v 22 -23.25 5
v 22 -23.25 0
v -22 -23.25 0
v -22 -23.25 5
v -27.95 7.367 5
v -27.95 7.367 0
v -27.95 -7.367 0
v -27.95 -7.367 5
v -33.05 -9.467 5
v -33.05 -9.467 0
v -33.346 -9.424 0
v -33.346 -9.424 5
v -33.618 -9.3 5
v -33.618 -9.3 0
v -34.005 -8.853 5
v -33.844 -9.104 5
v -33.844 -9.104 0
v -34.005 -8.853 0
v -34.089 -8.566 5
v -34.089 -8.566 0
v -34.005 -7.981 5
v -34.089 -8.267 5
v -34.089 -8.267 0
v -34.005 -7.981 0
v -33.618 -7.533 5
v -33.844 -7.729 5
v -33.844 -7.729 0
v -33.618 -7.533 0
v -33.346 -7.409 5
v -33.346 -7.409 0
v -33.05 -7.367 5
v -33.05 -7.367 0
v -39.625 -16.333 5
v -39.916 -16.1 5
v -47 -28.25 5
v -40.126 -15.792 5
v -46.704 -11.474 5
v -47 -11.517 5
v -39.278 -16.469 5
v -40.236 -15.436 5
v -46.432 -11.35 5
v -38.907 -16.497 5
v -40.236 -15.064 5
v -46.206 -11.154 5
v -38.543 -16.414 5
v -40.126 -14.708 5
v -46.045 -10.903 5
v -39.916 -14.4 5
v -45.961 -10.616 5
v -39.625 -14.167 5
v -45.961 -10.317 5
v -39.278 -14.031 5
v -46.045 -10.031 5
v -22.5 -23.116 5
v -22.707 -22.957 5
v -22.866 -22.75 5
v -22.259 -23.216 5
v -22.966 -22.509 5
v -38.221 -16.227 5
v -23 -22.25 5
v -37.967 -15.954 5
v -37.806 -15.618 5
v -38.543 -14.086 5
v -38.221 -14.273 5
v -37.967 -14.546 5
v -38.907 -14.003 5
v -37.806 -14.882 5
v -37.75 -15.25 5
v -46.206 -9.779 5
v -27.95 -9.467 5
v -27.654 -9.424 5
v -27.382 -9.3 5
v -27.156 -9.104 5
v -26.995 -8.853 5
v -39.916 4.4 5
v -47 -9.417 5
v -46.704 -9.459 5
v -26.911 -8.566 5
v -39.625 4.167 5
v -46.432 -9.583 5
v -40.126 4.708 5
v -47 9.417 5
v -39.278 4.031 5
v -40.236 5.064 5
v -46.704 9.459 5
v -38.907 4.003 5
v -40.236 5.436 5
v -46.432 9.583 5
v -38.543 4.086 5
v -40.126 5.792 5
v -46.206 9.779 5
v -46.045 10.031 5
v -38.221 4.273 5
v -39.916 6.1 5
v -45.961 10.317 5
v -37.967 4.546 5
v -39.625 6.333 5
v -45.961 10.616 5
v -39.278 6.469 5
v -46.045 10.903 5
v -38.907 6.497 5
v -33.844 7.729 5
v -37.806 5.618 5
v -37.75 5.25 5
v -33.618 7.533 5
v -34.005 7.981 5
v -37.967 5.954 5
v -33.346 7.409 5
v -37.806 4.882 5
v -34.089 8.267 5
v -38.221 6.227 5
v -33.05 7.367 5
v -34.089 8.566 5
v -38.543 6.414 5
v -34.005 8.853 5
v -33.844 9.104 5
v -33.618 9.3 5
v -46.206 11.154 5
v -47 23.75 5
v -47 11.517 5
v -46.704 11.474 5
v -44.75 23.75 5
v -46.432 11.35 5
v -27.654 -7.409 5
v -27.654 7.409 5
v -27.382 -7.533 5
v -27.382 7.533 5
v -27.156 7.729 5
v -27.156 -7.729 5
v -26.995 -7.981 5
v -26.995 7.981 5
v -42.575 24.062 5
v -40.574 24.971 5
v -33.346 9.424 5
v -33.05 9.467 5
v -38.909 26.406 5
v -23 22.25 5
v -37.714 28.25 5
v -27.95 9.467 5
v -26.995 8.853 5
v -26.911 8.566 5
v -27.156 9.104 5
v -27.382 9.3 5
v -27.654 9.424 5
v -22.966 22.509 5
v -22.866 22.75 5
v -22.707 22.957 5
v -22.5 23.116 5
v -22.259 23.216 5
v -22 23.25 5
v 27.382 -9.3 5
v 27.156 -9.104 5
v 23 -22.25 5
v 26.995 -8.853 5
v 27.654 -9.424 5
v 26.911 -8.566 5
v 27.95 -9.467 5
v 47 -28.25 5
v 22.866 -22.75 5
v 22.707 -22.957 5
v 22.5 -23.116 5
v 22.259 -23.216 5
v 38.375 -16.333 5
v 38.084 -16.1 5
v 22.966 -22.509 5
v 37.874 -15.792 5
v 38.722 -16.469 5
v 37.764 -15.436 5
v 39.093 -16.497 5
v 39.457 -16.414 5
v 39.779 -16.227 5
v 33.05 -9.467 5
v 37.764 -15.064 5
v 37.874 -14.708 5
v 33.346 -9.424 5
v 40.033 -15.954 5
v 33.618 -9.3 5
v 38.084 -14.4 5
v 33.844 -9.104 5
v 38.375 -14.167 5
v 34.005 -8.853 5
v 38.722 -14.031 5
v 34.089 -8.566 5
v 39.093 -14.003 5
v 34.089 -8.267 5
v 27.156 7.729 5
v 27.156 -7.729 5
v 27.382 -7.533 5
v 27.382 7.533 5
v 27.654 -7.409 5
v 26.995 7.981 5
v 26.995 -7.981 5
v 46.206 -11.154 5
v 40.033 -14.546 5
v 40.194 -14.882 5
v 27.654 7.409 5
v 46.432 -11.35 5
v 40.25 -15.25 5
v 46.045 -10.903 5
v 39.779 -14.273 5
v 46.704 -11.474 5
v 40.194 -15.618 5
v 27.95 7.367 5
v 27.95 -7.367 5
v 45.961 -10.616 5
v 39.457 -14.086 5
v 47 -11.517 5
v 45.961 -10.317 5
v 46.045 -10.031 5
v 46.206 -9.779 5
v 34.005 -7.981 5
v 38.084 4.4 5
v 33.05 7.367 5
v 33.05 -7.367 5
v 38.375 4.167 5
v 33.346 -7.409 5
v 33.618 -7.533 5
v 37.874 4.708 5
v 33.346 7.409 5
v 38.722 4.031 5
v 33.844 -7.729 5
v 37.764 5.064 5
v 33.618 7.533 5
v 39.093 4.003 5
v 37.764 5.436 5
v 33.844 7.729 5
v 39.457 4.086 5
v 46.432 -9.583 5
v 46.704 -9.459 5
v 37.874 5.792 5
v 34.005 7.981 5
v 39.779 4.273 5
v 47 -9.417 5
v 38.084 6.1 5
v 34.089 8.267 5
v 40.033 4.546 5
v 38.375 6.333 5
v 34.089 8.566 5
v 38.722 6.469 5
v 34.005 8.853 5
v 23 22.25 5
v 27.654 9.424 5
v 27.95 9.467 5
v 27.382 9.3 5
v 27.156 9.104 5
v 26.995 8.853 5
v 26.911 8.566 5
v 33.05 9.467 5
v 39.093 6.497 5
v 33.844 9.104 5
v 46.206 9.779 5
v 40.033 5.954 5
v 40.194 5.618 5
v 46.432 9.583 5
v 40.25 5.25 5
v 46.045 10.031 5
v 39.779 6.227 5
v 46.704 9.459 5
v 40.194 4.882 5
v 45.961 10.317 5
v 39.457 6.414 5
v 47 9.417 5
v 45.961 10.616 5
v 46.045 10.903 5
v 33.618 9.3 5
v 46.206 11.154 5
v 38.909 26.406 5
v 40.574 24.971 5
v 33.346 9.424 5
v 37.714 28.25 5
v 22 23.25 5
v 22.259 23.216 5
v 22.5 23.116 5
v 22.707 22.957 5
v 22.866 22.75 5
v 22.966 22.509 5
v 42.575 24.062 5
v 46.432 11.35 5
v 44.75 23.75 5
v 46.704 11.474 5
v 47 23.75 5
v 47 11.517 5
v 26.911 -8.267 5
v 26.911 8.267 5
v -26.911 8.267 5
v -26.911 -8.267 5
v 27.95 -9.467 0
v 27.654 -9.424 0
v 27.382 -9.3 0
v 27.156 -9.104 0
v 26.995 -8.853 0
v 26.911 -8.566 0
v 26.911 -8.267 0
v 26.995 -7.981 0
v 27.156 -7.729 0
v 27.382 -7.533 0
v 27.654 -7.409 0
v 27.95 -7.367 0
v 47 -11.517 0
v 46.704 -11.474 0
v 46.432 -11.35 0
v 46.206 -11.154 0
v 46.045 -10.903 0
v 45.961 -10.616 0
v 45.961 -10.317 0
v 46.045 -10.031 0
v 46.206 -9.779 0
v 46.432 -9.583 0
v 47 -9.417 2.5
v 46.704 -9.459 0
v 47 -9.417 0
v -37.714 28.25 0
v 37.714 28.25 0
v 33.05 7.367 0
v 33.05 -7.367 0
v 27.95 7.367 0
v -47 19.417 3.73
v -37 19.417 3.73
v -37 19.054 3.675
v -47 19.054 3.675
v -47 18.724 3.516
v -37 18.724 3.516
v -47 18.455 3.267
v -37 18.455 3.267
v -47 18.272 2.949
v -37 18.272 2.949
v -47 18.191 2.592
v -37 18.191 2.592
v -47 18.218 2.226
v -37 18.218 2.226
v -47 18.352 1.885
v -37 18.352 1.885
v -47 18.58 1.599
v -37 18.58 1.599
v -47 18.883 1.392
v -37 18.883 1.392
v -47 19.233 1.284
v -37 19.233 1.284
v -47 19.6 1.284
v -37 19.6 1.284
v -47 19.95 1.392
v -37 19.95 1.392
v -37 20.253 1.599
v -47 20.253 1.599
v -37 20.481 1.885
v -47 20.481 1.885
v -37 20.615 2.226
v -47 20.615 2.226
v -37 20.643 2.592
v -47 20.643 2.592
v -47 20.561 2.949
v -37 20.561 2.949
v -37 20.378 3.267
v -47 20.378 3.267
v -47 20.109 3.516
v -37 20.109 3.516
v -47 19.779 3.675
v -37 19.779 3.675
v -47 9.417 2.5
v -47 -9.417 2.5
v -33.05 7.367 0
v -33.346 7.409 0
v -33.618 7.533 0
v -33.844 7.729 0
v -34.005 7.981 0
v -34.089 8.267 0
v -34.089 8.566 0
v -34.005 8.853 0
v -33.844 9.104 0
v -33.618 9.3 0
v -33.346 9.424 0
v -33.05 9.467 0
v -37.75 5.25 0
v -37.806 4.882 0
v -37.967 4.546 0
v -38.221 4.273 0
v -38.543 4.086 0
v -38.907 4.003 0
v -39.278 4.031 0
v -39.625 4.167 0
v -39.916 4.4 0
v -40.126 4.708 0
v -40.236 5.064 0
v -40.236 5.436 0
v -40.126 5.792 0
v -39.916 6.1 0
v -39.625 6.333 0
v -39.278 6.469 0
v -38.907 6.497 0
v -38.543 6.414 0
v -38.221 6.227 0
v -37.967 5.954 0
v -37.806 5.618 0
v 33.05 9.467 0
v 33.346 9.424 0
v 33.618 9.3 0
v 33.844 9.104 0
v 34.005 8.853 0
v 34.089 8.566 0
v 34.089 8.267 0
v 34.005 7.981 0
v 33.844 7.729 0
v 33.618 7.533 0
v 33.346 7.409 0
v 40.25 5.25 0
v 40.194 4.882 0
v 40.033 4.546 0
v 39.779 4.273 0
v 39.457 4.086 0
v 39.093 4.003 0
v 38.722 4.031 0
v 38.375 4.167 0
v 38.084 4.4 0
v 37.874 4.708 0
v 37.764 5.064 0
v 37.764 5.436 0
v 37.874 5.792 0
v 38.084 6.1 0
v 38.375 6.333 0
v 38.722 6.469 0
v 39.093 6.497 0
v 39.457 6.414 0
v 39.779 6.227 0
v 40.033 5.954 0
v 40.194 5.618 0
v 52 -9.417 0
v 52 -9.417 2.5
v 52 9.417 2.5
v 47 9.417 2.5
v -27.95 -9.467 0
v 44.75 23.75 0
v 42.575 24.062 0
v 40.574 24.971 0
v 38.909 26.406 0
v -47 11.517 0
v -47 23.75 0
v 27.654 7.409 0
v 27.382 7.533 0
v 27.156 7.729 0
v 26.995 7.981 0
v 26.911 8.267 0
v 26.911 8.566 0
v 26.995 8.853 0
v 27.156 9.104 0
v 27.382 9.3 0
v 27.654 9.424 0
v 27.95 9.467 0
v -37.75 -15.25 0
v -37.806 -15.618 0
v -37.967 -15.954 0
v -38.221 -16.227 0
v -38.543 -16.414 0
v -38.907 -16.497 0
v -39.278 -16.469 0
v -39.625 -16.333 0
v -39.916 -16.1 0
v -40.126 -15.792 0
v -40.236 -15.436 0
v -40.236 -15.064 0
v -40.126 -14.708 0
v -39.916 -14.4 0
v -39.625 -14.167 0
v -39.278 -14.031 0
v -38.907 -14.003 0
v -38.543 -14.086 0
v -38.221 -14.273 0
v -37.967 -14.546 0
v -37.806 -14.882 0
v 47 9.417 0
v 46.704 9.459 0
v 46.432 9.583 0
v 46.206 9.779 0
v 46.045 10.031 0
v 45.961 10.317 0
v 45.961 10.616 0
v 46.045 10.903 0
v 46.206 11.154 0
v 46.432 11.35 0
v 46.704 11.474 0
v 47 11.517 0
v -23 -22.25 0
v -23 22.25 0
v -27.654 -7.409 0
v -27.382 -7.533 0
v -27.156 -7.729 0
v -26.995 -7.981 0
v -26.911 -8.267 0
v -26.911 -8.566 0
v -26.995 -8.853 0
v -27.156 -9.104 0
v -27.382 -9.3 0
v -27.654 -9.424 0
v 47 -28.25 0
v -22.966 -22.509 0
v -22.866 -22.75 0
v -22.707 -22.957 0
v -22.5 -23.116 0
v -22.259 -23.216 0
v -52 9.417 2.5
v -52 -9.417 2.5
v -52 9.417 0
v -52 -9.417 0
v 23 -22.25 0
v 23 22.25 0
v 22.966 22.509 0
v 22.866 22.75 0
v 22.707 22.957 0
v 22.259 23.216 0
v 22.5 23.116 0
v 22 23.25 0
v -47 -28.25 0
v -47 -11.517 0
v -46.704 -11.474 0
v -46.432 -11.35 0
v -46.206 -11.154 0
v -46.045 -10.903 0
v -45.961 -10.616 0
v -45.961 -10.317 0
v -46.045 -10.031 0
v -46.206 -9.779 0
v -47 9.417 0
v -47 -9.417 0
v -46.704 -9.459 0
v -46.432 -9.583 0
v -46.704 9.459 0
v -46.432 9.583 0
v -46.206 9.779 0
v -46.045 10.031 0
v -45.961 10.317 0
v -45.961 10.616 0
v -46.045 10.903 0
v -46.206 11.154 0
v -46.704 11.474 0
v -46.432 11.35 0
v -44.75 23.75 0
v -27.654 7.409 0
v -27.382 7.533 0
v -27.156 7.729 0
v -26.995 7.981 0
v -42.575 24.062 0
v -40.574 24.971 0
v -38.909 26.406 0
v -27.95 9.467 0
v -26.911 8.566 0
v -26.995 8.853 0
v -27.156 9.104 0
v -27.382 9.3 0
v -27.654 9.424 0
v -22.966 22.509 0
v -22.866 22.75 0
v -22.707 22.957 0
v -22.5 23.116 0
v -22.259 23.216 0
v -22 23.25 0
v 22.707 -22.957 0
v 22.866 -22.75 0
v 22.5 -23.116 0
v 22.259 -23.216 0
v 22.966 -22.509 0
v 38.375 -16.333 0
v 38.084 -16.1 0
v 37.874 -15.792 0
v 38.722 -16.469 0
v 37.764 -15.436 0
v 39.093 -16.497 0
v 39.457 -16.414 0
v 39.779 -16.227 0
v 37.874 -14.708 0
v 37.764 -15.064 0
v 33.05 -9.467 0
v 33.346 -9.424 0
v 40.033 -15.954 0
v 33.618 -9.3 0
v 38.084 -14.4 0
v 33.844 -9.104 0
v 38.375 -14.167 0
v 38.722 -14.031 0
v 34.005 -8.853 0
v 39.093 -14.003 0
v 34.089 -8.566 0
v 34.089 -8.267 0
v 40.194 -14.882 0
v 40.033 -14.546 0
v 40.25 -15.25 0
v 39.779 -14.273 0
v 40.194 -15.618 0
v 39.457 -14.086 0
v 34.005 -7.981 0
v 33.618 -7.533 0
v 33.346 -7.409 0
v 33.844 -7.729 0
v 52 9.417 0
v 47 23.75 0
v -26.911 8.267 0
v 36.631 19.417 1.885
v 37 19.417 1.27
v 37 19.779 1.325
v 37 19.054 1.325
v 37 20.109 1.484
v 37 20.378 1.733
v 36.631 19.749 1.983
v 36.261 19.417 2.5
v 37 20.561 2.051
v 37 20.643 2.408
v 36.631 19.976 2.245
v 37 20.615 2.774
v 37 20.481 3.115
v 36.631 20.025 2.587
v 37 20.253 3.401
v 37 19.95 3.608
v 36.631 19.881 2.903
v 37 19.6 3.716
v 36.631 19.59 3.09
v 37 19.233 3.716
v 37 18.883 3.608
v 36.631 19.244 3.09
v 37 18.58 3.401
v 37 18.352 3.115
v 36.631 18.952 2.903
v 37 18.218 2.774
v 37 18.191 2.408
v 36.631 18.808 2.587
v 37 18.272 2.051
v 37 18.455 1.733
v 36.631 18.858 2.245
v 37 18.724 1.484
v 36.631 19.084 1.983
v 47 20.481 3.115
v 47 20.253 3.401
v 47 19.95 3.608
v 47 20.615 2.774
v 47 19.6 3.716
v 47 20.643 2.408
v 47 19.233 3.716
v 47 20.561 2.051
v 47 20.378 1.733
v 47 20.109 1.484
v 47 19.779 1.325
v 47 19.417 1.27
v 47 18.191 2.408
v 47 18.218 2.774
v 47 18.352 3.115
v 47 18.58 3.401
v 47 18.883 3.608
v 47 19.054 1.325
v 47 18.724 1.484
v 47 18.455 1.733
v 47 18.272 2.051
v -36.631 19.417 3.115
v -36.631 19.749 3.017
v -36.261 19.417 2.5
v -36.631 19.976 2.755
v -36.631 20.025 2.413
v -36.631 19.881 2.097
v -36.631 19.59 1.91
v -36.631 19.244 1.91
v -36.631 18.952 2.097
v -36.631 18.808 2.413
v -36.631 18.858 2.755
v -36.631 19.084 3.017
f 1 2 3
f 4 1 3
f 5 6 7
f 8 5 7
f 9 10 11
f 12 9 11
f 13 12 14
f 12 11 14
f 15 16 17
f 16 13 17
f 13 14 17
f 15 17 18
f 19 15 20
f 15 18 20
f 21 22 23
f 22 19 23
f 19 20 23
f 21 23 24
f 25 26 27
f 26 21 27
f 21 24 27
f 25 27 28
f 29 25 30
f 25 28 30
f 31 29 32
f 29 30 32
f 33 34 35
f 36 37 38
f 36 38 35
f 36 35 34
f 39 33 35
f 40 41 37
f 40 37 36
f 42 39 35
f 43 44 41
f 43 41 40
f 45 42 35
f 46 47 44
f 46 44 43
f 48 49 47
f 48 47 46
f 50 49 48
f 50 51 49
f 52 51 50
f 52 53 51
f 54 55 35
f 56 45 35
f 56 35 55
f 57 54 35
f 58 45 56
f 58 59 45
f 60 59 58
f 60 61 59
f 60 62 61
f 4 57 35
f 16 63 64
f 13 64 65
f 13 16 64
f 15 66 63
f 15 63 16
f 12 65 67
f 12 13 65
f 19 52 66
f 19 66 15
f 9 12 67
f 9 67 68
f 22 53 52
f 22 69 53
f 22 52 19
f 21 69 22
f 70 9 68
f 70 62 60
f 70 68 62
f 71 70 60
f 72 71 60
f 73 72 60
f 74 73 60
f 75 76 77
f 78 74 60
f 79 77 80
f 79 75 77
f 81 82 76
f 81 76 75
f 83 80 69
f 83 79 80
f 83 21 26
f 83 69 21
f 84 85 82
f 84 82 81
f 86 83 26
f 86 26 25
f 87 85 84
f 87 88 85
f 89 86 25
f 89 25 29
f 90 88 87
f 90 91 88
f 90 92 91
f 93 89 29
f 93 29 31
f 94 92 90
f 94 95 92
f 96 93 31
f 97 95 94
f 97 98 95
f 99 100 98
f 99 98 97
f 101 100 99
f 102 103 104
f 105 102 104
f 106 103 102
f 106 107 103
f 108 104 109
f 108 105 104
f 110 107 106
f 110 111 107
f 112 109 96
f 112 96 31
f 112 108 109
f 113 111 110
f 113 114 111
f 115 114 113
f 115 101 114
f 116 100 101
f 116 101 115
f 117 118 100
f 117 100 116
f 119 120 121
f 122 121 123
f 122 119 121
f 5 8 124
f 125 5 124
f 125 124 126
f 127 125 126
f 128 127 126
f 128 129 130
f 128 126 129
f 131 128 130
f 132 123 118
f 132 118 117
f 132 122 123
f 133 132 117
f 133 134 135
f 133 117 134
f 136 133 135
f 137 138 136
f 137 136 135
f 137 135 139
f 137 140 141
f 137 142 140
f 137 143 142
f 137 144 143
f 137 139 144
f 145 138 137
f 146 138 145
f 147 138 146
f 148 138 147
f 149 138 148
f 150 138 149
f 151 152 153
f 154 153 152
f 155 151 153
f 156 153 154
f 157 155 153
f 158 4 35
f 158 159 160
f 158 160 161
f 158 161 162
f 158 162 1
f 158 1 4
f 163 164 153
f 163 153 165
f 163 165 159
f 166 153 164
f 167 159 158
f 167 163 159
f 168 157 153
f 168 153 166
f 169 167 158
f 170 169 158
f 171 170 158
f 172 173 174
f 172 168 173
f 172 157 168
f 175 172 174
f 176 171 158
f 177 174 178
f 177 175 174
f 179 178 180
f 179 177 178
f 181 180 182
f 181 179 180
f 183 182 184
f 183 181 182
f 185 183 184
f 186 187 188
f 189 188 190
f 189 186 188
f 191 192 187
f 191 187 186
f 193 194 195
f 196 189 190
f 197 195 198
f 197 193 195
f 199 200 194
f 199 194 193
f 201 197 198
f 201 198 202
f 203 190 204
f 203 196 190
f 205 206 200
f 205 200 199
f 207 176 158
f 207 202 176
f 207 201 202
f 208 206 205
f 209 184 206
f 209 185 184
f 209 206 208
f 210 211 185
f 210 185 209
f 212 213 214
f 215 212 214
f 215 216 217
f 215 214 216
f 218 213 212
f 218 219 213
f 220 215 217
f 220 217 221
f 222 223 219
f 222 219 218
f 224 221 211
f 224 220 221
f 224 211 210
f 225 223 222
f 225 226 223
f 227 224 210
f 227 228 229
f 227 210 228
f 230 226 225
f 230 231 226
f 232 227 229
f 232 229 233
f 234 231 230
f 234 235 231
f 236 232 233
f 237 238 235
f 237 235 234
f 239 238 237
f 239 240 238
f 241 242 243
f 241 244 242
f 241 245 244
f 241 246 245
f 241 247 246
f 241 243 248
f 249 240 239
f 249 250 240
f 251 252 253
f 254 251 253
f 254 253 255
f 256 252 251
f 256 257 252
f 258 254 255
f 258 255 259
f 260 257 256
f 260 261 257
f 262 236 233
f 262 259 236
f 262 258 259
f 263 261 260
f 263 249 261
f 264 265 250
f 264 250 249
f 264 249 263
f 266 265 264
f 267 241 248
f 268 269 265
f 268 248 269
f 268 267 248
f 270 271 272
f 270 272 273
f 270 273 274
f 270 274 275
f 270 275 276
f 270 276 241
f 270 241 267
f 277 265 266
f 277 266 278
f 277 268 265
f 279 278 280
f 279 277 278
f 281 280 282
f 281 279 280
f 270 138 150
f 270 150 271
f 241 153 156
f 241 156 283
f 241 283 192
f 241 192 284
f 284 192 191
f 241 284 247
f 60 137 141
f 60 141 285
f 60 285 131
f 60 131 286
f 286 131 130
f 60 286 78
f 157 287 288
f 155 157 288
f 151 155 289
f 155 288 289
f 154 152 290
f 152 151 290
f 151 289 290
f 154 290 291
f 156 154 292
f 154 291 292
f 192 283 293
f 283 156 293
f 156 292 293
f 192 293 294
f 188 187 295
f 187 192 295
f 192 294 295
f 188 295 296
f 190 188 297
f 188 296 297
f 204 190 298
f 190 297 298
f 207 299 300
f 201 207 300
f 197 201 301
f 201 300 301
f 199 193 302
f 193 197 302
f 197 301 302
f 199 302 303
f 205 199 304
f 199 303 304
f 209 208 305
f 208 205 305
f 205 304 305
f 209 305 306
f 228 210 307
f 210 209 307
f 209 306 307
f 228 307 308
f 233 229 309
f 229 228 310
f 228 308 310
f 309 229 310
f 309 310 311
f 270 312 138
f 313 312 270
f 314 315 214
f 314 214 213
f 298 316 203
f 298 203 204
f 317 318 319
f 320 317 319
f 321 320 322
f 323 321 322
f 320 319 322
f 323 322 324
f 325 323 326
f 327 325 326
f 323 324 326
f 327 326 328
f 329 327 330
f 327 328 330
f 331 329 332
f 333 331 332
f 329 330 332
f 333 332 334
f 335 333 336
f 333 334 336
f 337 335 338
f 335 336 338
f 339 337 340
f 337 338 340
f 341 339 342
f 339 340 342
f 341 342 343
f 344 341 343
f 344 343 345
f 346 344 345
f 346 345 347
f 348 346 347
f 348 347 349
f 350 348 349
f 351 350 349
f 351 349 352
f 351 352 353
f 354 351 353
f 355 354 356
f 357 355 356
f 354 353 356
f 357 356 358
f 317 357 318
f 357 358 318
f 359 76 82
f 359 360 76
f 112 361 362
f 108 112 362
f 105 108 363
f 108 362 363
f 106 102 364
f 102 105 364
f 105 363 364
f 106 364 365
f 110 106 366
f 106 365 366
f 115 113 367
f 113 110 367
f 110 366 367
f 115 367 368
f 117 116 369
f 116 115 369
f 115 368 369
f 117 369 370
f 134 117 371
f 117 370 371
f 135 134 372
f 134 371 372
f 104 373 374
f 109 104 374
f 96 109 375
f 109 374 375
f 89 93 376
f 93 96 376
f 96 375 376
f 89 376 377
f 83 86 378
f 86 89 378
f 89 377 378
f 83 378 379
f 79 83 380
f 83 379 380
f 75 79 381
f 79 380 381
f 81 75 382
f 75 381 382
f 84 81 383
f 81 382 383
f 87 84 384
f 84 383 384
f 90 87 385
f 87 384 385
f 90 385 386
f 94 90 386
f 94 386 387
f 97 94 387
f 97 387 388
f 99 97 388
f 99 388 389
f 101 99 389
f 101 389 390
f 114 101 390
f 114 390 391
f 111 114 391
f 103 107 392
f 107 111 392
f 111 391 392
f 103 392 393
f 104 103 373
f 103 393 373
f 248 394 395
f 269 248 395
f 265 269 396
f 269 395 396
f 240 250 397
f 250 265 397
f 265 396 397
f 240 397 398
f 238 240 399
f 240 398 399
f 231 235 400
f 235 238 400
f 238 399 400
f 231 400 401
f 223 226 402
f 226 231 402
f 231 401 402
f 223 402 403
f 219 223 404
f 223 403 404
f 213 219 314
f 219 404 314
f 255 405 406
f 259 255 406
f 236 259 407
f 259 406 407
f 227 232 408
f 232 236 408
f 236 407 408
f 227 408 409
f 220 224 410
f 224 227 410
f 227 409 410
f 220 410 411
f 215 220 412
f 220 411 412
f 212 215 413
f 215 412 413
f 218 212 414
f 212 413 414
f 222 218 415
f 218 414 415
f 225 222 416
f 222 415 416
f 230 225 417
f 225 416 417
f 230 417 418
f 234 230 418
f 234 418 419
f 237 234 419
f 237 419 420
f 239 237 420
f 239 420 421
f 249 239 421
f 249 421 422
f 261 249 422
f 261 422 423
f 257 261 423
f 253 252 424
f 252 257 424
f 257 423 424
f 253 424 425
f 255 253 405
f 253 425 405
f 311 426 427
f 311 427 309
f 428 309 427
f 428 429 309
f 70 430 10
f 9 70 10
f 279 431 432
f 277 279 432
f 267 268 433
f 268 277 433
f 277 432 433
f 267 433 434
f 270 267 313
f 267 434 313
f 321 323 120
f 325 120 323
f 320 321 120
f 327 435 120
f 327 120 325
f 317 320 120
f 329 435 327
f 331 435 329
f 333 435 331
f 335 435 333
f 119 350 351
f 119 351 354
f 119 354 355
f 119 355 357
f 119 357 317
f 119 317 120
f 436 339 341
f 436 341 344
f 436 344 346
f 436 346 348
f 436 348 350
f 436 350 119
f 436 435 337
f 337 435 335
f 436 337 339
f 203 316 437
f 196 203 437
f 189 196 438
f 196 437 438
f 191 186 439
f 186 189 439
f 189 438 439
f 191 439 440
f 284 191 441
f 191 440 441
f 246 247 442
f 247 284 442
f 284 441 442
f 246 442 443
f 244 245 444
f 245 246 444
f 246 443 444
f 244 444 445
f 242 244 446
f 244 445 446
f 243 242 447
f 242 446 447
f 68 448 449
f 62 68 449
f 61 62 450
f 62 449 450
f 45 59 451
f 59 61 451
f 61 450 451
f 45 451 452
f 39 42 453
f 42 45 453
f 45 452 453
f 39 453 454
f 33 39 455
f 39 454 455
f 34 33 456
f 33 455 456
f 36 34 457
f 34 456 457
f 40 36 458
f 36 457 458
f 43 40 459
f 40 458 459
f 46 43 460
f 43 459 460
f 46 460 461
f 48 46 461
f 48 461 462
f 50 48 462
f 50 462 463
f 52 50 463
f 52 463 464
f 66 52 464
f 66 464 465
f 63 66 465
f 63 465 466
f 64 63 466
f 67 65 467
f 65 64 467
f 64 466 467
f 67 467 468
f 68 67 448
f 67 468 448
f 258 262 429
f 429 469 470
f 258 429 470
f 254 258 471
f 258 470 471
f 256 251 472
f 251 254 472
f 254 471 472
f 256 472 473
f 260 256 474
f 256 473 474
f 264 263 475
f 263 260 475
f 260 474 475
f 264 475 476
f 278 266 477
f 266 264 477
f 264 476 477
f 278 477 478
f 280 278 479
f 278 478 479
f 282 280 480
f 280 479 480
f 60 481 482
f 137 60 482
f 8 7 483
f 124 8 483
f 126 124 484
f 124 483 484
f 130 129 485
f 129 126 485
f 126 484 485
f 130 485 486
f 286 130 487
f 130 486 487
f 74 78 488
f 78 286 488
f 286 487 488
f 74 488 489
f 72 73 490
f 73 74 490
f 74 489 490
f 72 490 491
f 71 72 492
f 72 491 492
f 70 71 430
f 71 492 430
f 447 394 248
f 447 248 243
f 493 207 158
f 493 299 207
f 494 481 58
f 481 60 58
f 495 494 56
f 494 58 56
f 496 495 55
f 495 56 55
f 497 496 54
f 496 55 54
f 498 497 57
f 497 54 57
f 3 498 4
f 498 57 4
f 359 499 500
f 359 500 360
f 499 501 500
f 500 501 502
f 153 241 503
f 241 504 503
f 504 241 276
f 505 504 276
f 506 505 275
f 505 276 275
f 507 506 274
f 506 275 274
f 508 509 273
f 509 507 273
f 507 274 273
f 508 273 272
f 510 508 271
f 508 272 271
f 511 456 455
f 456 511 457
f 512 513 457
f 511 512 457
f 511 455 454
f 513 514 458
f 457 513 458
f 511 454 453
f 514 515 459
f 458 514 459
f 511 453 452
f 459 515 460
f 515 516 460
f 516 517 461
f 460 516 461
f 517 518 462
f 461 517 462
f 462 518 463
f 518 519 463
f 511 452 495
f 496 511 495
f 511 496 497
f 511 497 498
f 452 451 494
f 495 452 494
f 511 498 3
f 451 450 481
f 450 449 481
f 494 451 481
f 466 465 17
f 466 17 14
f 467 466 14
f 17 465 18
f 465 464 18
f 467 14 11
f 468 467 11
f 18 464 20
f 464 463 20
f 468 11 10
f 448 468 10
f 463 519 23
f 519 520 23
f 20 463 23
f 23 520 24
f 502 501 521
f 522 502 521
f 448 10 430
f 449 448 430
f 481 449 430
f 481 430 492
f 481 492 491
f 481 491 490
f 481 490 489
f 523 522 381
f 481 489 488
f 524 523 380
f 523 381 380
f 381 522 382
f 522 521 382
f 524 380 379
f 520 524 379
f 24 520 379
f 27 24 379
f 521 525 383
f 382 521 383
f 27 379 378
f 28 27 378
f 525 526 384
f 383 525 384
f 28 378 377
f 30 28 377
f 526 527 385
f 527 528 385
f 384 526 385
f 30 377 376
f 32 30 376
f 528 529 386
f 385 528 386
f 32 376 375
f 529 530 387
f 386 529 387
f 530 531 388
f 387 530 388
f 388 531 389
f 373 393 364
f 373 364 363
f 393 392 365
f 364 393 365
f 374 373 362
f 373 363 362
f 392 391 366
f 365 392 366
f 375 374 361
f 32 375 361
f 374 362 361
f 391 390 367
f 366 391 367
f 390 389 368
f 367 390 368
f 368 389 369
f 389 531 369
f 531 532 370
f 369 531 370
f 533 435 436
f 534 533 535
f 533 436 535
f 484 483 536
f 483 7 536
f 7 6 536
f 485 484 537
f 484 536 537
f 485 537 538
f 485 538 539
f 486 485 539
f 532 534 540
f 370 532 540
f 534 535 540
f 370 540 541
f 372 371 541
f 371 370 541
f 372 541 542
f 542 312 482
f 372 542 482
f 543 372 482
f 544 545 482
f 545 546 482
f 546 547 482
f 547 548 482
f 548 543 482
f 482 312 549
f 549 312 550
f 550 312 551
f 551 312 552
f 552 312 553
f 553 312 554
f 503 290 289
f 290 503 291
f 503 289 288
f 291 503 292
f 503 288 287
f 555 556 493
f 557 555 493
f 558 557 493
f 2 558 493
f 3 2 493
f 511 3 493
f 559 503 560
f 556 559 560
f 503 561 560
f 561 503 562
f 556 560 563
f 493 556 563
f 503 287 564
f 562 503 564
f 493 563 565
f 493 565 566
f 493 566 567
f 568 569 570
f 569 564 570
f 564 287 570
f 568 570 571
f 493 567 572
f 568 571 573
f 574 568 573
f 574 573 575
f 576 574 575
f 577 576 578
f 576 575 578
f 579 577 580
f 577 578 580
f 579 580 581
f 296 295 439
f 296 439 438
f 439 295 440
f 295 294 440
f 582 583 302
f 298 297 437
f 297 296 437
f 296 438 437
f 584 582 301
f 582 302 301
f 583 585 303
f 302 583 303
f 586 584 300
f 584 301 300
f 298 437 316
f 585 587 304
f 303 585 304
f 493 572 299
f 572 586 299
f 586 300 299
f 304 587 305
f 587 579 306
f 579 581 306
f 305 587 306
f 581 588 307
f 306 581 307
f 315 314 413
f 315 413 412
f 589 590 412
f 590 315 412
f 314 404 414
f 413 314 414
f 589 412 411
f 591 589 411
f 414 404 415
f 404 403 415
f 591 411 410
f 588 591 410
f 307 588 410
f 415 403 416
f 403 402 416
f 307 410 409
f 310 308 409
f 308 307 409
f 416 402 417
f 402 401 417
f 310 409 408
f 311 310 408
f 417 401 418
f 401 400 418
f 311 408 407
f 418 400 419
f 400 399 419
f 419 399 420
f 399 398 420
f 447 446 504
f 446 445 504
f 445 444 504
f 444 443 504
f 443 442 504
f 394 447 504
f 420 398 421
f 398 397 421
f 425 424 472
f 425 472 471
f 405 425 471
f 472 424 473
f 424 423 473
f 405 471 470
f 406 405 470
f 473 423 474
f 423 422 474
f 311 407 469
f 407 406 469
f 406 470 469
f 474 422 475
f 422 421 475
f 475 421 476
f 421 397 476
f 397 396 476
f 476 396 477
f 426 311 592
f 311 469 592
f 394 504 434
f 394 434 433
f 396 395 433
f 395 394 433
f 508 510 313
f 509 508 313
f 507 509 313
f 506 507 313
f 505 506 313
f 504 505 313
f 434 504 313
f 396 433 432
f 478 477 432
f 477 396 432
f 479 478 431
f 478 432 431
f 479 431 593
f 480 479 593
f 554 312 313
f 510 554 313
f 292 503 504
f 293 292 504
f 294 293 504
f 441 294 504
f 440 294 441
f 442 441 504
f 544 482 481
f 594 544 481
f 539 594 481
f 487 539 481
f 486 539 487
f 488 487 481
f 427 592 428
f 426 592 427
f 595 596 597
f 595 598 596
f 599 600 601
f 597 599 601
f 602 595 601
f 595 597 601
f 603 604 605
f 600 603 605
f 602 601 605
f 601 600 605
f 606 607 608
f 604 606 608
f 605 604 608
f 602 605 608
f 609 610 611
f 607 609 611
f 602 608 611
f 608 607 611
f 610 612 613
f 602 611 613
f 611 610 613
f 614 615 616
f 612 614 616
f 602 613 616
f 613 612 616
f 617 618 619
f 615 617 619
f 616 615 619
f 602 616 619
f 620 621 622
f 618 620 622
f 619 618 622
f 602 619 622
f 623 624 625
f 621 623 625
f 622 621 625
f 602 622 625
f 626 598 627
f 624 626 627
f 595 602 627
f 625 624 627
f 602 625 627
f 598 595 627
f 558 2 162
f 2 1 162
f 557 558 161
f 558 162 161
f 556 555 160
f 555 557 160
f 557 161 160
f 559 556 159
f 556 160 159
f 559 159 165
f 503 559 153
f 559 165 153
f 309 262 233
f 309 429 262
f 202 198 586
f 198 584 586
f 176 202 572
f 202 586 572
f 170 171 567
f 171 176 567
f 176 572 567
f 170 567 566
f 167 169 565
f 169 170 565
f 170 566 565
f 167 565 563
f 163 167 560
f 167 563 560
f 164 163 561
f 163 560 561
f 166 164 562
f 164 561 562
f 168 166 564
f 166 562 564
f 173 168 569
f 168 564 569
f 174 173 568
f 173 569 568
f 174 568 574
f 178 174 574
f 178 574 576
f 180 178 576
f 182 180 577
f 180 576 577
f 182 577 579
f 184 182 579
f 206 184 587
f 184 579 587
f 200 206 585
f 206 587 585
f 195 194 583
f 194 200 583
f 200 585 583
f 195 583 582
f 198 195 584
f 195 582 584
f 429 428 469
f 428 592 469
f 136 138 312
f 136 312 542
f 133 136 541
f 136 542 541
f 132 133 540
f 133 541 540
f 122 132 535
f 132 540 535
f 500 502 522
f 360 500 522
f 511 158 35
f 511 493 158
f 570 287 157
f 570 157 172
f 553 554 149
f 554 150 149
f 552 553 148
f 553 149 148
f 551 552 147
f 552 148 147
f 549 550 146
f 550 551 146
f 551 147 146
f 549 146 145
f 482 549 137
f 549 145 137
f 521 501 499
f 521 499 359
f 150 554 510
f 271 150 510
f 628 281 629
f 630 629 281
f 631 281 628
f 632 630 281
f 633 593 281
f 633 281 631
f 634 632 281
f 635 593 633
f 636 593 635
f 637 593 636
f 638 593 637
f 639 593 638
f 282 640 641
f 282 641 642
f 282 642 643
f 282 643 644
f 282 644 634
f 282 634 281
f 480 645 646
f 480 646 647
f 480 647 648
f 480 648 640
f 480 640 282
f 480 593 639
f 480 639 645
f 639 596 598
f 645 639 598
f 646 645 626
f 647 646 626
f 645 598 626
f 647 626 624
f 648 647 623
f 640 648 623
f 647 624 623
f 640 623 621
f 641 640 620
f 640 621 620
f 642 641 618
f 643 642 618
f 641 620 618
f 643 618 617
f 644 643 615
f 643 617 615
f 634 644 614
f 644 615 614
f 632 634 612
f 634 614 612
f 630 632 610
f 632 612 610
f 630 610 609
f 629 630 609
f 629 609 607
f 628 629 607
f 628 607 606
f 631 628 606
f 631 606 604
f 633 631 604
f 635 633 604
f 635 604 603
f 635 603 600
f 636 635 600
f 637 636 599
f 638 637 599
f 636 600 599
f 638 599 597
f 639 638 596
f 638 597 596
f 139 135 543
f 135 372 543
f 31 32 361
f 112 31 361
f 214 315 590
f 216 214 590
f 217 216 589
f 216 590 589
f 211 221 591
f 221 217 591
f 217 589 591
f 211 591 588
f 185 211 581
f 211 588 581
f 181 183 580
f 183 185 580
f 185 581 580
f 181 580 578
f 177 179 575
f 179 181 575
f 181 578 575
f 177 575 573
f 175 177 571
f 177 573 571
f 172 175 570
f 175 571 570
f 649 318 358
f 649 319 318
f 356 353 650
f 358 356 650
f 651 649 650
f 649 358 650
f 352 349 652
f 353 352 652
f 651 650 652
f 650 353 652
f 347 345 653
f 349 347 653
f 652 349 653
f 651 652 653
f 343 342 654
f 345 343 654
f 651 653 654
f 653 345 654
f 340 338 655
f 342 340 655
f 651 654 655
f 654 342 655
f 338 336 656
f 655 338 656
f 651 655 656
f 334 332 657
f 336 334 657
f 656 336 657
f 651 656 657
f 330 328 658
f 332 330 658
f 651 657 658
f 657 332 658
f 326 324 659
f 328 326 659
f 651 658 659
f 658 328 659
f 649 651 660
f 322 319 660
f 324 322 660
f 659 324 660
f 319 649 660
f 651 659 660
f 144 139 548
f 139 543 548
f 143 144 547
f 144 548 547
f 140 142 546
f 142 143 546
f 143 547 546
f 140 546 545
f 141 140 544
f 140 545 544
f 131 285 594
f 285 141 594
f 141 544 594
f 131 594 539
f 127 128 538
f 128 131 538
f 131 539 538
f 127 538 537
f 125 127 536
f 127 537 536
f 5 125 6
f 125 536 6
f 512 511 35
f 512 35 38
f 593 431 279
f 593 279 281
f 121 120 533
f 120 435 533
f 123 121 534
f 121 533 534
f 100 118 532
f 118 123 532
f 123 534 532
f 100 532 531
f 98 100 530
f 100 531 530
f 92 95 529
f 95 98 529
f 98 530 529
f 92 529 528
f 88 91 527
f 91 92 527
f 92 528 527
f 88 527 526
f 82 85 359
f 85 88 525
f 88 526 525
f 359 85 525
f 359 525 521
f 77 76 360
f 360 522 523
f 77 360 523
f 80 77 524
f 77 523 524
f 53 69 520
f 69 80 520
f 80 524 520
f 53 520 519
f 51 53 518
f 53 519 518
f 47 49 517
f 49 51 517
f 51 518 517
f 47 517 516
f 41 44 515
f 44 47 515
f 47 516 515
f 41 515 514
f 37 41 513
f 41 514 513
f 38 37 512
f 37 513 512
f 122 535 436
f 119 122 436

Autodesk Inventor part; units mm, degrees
ref_plane "YZ Plane" through (0, 0, 0) normal (1, 0, 0) x (0, 1, 0)
ref_plane "XZ Plane" through (0, 0, 0) normal (0, 1, 0) x (-1, 0, 0)
ref_plane "XY Plane" through (0, 0, 0) normal (0, 0, 1) x (1, 0, 0)
sketch "スケッチ1" plane through (0, 0, 0) normal (0, 0, 1) x (1, 0, 0)
  line L0 (-47, 28.25) -> (-37.7144, 28.25)
  line L1 (47, 28.25) -> (47, 23.75)
  line L2 (47, -28.25) -> (-47, -28.25)
  line L3 (-47, -28.25) -> (-47, -11.5167)
  line L4 (-47, 28.25) -> (47, -28.25) construction
  line L5 (47, 28.25) -> (-47, -28.25) construction
  line L6 (0, 28.25) -> (0, -28.25) construction
  line L7 (-33, 9.4167) -> (-28, 9.4167) construction
  line L8 (-28, 9.4167) -> (-28, -9.4167) construction
  line L9 (-28, -9.4167) -> (-33, -9.4167) construction
  line L10 (-33, -9.4167) -> (-33, 9.4167) construction
  line L11 (-33, 9.4167) -> (-28, -9.4167) construction
  line L12 (-28, 9.4167) -> (-33, -9.4167) construction
  line L13 (-33.05, 9.4667) -> (-27.95, 9.4667)
  line L14 (-27.95, 9.4667) -> (-27.95, 7.3667) construction
  line L15 (-27.95, -9.4667) -> (-33.05, -9.4667)
  line L16 (-33.05, -9.4667) -> (-33.05, -7.3667) construction
  line L17 (-33.05, 9.4667) -> (-27.95, -9.4667) construction
  line L18 (-27.95, 9.4667) -> (-33.05, -9.4667) construction
  arc A0 (-33.05, 9.4667) -> (-33.05, 7.3667) centre (-33.05, 8.4167) ccw
  line L19 (-30.5, 9.4667) -> (-30.5, -9.4667) construction
  arc A1 (-27.95, 7.3667) -> (-27.95, 9.4667) centre (-27.95, 8.4167) ccw
  line L20 (-33.05, 7.3667) -> (-33.05, 9.4667) construction
  line L21 (-27.95, 7.3667) -> (-27.95, -7.3667)
  line L22 (-33.05, -7.3667) -> (-33.05, 7.3667)
  line L23 (-27.95, -7.3667) -> (-27.95, -9.4667) construction
  line L24 (33, 9.4167) -> (28, 9.4167) construction
  line L25 (28, 9.4167) -> (28, -9.4167) construction
  line L26 (28, -9.4167) -> (33, -9.4167) construction
  line L27 (33, -9.4167) -> (33, 9.4167) construction
  line L28 (33, 9.4167) -> (28, -9.4167) construction
  line L29 (28, 9.4167) -> (33, -9.4167) construction
  line L30 (33.05, 9.4667) -> (27.95, 9.4667)
  line L31 (27.95, 9.4667) -> (27.95, 7.3667) construction
  line L32 (27.95, -9.4667) -> (33.05, -9.4667)
  line L33 (33.05, -9.4667) -> (33.05, -7.3667) construction
  line L34 (33.05, 9.4667) -> (27.95, -9.4667) construction
  line L35 (27.95, 9.4667) -> (33.05, -9.4667) construction
  arc A2 (33.05, 7.3667) -> (33.05, 9.4667) centre (33.05, 8.4167) ccw
  line L36 (30.5, 9.4667) -> (30.5, -9.4667) construction
  arc A3 (27.95, 9.4667) -> (27.95, 7.3667) centre (27.95, 8.4167) ccw
  line L37 (33.05, 7.3667) -> (33.05, 9.4667) construction
  line L38 (27.95, 7.3667) -> (27.95, -7.3667)
  line L39 (33.05, -7.3667) -> (33.05, 7.3667)
  line L40 (27.95, -7.3667) -> (27.95, -9.4667) construction
  line L41 (-52, 9.4167) -> (-52, -9.4167)
  line L42 (-52, 9.4167) -> (-47, 9.4167)
  arc A4 (-47, 9.4167) -> (-47, 11.5167) centre (-47, 10.4667) ccw
  line L43 (-47, 11.5167) -> (-47, 23.75)
  line L44 (-47, -11.5167) -> (-47, 11.5167)
  line L45 (52, 9.4167) -> (52, -9.4167)
  line L46 (52, 9.4167) -> (47, 9.4167)
  arc A5 (47, 11.5167) -> (47, 9.4167) centre (47, 10.4667) ccw
  line L47 (47, 11.5167) -> (47, -11.5167)
  line L48 (47, -11.5167) -> (47, -28.25)
  line L49 (-52, 0) -> (52, 0) construction
  line L50 (-52, -9.4167) -> (-47, -9.4167)
  arc A6 (-47, -11.5167) -> (-47, -9.4167) centre (-47, -10.4667) ccw
  arc A7 (47, -9.4167) -> (47, -11.5167) centre (47, -10.4667) ccw
  line L51 (52, -9.4167) -> (47, -9.4167)
  line L52 (-33.05, 0) -> (-27.95, 0) construction
  arc A8 (-33.05, -7.3667) -> (-33.05, -9.4667) centre (-33.05, -8.4167) ccw
  arc A9 (-27.95, -9.4667) -> (-27.95, -7.3667) centre (-27.95, -8.4167) ccw
  arc A10 (27.95, -7.3667) -> (27.95, -9.4667) centre (27.95, -8.4167) ccw
  arc A11 (33.05, -9.4667) -> (33.05, -7.3667) centre (33.05, -8.4167) ccw
  arc A12 (-47, 24.0838) -> (-37.7144, 28.25) centre (-44.75, 31.5) ccw
  arc A13 (37.7144, 28.25) -> (47, 24.0838) centre (44.75, 31.5) ccw
  line L53 (-47, 24.0838) -> (-47, 28.25)
  line L54 (-37.7144, 28.25) -> (47, 28.25)
  arc A14 (-37.7144, 28.25) -> (-47, 24.0838) centre (-44.75, 31.5) ccw
  arc A15 (47, 24.0838) -> (37.7144, 28.25) centre (44.75, 31.5) ccw
  line L55 (-44.75, 23.75) -> (-47, 23.75)
  line L56 (44.75, 23.75) -> (47, 23.75)
  line L57 (-47, 23.75) -> (-47, 24.0838)
  line L58 (47, 23.75) -> (47, 11.5167)
  line L59 (-23, 23.25) -> (23, 23.25)
  line L60 (23, 23.25) -> (23, -23.25)
  line L61 (23, -23.25) -> (-23, -23.25)
  line L62 (-23, -23.25) -> (-23, 23.25)
  line L63 (-23, 23.25) -> (23, -23.25) construction
  line L64 (23, 23.25) -> (-23, -23.25) construction
  line L65 (-42, 8.25) -> (42, 8.25) construction
  line L66 (42, 8.25) -> (42, -18.25) construction
  line L67 (42, -18.25) -> (-42, -18.25) construction
  line L68 (-42, -18.25) -> (-42, 8.25) construction
  line L69 (-42, 8.25) -> (42, -18.25) construction
  line L70 (42, 8.25) -> (-42, -18.25) construction
  circle A16 centre (-39, 5.25) radius 1.25
  line L71 (-42, -5) -> (42, -5) construction
  circle A17 centre (-39, -15.25) radius 1.25
  circle A18 centre (39, 5.25) radius 1.25
  circle A19 centre (39, -15.25) radius 1.25
  point P0 (0, 0)
  point P1 (-30.5, 0)
  point P2 (30.5, 0)
  point P3 (0, 0)
  point P4 (-30.5, 0)
  point P5 (-30.5, 0)
  point P6 (0, 0)
  point P7 (0, 0)
  point P8 (47, 9.4167)
  point P9 (47, 9.4167)
  point P10 (0, -5)
  point P11 (0, -5)
  dimension "d0" = 94
  dimension "d1" = 56.5
  dimension "d2" = 5
  dimension "d3" = 18.8333
  dimension "d4" = 1.05
  dimension "d5" = 0.05
  dimension "d6" = 0.05
  dimension "d7" = 56
  dimension "d10" = 1.05
  dimension "d11" = 5
  dimension "d34" = 18.8333
  dimension "d40" = 31.5
  dimension "d41" = 89.5
  dimension "d42" = 15.5
  dimension "d43" = 52
  dimension "d60" = 5
  dimension "d63" = 5
  dimension "d69" = 5
  dimension "d70" = 20
  dimension "d71" = 10
  dimension "d72" = 84
  dimension "d73" = 26.5
  dimension "d78" = 2.5
  dimension "d80" = 3
  dimension "d81" = 3
extrude "押し出し1" add sketch "スケッチ1" along normal blind 5 contours L54 A13 L56 L58 A5 L47 A7 L48 L2 L3 A6 L44 A4 L43 L55 A12
extrude "押し出し2" add sketch "スケッチ1" along normal blind 2.5 contours L44 L50 L41 L42 | L46 L45 L51 L47
sketch "スケッチ2" plane through (47, 11.5167, 0) normal (1, 0, 0) x (0, 0, -1)
  line L0 (0, -23.0333) -> (-5, -23.0333) projected
  line L1 (-2.5, -23.0333) -> (-2.5, -39.7667)
  line L2 (0, -39.7667) -> (-5, -39.7667) projected
  line L3 (0, -2.1) -> (-2.5, -2.1) projected
  line L4 (0, -20.9333) -> (-2.5, -20.9333) projected
  point P0 (0, -11.5167)
  point P1 (-2.5, 7.9)
  dimension "d67" = 10
hole "穴1" at (47, 19.4167, 2.5) direction (-1, 0, 0) diameter 2.459 depth 10 tip angle 118 thread size "M3x0.5" class "6H" standard "ANSI Metric M Profile"
sketch "スケッチ3" plane through (-47, 11.5167, 0) normal (-1, 0, 0) x (0, 0, 1)
  circle A0 centre (2.5, 7.9) radius 1.2295 projected
  circle A1 centre (2.5, -30.9333) radius 1.2295 projected
  point P0 (0, -11.5167)
  point P1 (2.5, 7.9)
hole "穴2" at (-47, 19.4167, 2.5) direction (1, 0, 0) diameter 2.459 depth 10 tip angle 118 thread size "M3x0.5" class "6H" standard "ANSI Metric M Profile"
fillet "フィレット1" radius 1 4 edges at (-23, 23.25, 2.5) (-23, -23.25, 2.5) (23, -23.25, 2.5) (23, 23.25, 2.5)
equation "\"d3\" = d34"
equation "\"d6\" = d5"
equation "\"d10\" = d4"
properties part number "Cockpit_horizontal_frame_04" material "アセタール樹脂、黒"
